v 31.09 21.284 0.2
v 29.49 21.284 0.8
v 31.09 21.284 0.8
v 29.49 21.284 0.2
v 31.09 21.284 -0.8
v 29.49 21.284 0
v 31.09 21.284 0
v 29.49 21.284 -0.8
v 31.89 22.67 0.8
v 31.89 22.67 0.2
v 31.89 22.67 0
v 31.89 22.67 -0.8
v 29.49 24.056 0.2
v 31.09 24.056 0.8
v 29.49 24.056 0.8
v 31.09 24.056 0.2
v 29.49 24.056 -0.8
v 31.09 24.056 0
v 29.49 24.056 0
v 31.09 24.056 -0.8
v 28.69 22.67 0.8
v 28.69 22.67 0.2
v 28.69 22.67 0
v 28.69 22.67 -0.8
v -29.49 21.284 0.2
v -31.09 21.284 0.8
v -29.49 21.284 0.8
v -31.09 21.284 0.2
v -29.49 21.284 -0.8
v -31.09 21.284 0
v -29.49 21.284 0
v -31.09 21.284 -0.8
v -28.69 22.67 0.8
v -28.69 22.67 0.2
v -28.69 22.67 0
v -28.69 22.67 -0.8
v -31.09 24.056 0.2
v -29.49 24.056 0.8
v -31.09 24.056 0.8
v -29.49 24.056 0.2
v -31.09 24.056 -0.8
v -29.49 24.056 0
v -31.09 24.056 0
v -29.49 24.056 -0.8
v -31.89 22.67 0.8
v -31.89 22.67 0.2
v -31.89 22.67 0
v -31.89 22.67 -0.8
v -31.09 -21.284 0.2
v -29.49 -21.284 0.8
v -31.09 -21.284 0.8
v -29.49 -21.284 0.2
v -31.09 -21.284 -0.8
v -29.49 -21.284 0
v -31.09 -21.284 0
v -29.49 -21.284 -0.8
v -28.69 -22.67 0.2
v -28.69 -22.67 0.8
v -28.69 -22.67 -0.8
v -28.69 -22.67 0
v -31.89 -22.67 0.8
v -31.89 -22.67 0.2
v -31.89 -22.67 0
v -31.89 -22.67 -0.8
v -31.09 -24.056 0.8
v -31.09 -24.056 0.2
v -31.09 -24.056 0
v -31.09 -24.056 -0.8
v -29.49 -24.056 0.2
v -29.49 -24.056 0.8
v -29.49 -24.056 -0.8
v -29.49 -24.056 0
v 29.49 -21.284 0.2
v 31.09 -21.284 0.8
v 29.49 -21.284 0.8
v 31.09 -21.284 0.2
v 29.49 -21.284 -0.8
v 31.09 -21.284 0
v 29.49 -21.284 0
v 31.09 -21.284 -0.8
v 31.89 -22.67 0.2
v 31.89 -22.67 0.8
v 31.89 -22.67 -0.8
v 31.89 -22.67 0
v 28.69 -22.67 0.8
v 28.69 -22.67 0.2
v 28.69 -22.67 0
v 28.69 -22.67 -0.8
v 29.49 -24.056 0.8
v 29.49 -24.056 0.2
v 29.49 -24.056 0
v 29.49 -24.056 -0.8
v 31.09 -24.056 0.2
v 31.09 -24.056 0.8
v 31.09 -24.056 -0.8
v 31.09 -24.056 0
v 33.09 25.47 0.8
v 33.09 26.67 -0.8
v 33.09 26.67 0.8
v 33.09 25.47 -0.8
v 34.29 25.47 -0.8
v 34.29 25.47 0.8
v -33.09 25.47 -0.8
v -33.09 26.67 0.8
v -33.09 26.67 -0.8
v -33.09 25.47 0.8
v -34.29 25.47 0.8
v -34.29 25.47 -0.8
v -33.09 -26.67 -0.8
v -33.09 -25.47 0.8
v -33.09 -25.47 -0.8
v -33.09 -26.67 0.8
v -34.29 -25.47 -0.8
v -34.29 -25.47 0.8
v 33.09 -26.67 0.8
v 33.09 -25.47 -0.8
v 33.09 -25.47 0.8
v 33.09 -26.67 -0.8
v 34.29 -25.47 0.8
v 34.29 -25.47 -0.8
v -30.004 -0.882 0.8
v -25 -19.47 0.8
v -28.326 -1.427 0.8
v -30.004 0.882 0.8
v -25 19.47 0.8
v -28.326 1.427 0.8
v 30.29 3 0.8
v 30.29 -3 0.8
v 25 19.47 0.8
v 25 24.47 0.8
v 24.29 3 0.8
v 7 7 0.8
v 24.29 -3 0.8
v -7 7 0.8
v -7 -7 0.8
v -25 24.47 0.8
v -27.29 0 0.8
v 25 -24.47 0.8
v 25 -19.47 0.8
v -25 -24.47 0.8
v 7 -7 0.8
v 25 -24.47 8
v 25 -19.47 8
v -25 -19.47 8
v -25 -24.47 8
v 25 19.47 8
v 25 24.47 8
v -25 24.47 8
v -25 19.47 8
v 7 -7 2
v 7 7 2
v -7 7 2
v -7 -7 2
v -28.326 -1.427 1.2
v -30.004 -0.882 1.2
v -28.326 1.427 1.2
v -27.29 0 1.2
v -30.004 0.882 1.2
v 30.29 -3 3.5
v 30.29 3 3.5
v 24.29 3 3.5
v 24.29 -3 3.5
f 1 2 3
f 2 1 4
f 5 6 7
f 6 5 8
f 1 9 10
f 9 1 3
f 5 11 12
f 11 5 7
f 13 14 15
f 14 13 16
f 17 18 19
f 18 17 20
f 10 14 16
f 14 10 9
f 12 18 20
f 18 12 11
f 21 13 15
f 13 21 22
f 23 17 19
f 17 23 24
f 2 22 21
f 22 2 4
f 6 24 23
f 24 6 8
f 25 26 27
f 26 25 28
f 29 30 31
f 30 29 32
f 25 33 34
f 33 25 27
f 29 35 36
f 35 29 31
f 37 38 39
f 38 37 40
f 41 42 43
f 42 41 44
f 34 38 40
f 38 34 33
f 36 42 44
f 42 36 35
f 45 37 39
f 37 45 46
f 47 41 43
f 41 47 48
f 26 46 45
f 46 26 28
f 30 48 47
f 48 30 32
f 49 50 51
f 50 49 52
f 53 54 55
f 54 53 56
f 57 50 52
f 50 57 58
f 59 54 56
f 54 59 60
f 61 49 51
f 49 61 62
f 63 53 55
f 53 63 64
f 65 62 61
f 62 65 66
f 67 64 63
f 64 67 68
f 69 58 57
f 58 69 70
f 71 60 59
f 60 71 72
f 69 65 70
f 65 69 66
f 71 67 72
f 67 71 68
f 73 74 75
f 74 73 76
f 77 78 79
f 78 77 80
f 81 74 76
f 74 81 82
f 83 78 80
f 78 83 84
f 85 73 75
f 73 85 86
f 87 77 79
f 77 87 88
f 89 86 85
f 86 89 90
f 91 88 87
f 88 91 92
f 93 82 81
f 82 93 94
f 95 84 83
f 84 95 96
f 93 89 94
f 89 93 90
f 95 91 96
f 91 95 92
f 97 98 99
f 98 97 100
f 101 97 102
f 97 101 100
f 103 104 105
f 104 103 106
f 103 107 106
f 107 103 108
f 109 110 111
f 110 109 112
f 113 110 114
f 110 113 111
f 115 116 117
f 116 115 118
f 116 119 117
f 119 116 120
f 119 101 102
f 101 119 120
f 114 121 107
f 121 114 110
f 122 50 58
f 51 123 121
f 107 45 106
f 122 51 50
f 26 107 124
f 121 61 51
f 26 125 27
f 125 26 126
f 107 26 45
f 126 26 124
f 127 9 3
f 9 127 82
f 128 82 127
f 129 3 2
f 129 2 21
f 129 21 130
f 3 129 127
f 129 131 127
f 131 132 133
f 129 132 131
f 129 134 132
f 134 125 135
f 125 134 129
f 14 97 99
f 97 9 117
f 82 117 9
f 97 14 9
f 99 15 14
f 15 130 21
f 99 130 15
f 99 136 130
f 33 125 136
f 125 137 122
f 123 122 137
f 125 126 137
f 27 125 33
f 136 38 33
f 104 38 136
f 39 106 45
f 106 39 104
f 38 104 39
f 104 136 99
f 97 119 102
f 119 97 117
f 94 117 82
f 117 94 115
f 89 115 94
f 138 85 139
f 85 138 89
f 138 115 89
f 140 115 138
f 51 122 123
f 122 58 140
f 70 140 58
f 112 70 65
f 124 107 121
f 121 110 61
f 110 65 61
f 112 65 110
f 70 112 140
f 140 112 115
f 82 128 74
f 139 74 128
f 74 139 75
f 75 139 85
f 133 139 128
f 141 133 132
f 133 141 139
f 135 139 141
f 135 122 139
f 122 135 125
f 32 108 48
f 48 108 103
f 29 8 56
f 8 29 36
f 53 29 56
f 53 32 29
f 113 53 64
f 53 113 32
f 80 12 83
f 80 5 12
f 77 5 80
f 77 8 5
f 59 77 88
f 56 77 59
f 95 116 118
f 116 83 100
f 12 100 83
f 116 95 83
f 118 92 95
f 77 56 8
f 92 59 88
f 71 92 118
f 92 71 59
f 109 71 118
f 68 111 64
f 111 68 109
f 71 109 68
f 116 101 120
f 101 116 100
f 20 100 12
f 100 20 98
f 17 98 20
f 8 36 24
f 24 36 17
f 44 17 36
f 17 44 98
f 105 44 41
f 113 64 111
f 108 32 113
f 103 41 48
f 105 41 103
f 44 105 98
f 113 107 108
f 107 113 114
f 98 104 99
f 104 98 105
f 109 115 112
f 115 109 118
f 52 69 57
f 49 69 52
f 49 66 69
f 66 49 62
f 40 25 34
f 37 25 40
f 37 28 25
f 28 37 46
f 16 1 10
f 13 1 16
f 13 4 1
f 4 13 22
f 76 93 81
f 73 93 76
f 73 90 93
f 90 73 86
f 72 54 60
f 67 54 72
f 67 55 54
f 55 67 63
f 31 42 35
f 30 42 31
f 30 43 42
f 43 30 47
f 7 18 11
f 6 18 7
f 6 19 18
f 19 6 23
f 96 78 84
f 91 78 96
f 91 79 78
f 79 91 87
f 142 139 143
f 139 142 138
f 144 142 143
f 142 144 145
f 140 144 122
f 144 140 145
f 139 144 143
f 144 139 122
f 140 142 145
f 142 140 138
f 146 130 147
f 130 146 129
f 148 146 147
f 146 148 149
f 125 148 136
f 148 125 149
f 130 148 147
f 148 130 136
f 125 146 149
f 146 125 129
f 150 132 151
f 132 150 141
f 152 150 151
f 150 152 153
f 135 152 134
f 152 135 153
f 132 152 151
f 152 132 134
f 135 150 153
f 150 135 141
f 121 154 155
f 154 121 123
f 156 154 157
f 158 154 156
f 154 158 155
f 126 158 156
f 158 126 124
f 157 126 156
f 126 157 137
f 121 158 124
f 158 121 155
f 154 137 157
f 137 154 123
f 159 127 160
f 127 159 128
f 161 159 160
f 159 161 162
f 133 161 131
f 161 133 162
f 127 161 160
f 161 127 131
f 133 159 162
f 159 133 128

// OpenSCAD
// Parameters
pcb_L = 68.58; //[34.29:137.16:0.01]
pcb_W = 53.34; //[26.67:106.68:0.01]
pcb_T = 1.6; //[0.8:3.2:0.1]
hole_d = 3.2; //[1.6:6.4:0.1]
hole_edge_margin = 4.0; //[2.0:8.0:0.1]
hole_cut_extra = 0.6; //[0.2:2.0:0.1]
chamfer_size = 2.0; //[0.5:6.0:0.1]
chamfer_overlap = 0.8; //[0.2:2.0:0.1]
silk_T = 0.2; //[0.1:0.6:0.05]
silk_inset = 2.0; //[0.5:6.0:0.1]
header_L = 50.0; //[25.0:100.0:0.1]
header_W = 5.0; //[2.5:10.0:0.1]
header_H = 8.0; //[4.0:16.0:0.1]
header_edge_gap = 3.0; //[1.0:8.0:0.1]
attach_overlap = 0.8; //[0.2:2.0:0.1]
ic_L = 14.0; //[7.0:28.0:0.1]
ic_W = 14.0; //[7.0:28.0:0.1]
ic_H = 2.0; //[1.0:6.0:0.1]
led_r = 1.5; //[0.8:3.5:0.1]
led_H = 1.2; //[0.6:3.0:0.1]
button_L = 6.0; //[3.0:12.0:0.1]
button_W = 6.0; //[3.0:12.0:0.1]
button_H = 3.5; //[1.5:8.0:0.1]

// Main PCB Body
module pcb_main_body() {
  color([0.0, 0.4, 0.2]) // Green for PCB
  cube([pcb_L, pcb_W, pcb_T], center=true);
}

// Mounting Holes
module mounting_hole_cyl(position) {
  translate(position)
    cylinder(r=hole_d/2, h=pcb_T + hole_cut_extra, center=true);
}

module mounting_holes() {
  union() {
    mounting_hole_cyl([pcb_L/2 - hole_edge_margin, pcb_W/2 - hole_edge_margin, 0]);
    mounting_hole_cyl([-pcb_L/2 + hole_edge_margin, pcb_W/2 - hole_edge_margin, 0]);
    mounting_hole_cyl([-pcb_L/2 + hole_edge_margin, -pcb_W/2 + hole_edge_margin, 0]);
    mounting_hole_cyl([pcb_L/2 - hole_edge_margin, -pcb_W/2 + hole_edge_margin, 0]);
  }
}

// Chamfer Cuts
module chamfer_cut(position) {
  translate(position)
    cube([chamfer_size, chamfer_size, pcb_T + hole_cut_extra], center=true);
}

module edge_chamfer() {
  union() {
    chamfer_cut([pcb_L/2 - chamfer_size/2 + chamfer_overlap, pcb_W/2 - chamfer_size/2 + chamfer_overlap, 0]);
    chamfer_cut([-pcb_L/2 + chamfer_size/2 - chamfer_overlap, pcb_W/2 - chamfer_size/2 + chamfer_overlap, 0]);
    chamfer_cut([-pcb_L/2 + chamfer_size/2 - chamfer_overlap, -pcb_W/2 + chamfer_size/2 - chamfer_overlap, 0]);
    chamfer_cut([pcb_L/2 - chamfer_size/2 + chamfer_overlap, -pcb_W/2 + chamfer_size/2 - chamfer_overlap, 0]);
  }
}

// Silkscreen Markings
module silkscreen_markings() {
  color("White")
  translate([0, 0, pcb_T/2 + silk_T/2 - attach_overlap])
    cube([pcb_L - 2*silk_inset, pcb_W - 2*silk_inset, silk_T], center=true);
}

// Connectors Headers
module connectors_headers_left() {
  color("Black")
  translate([0, -pcb_W/2 + header_edge_gap + header_W/2 - attach_overlap, pcb_T/2 + header_H/2 - attach_overlap])
    cube([header_L, header_W, header_H], center=true);
}

module connectors_headers_right() {
  color("Black")
  translate([0, pcb_W/2 - header_edge_gap - header_W/2 + attach_overlap, pcb_T/2 + header_H/2 - attach_overlap])
    cube([header_L, header_W, header_H], center=true);
}

// IC Packages
module ic_packages_main() {
  color("DimGray")
  translate([0, 0, pcb_T/2 + ic_H/2 - attach_overlap])
    cube([ic_L, ic_W, ic_H], center=true);
}

// LEDs and Buttons
module leds_buttons_led1() {
  color("Red")
  translate([-pcb_L/2 + hole_edge_margin + led_r, 0, pcb_T/2 + led_H/2 - attach_overlap])
    cylinder(r=led_r, h=led_H, center=true);
}

module leds_buttons_button1() {
  color("Blue")
  translate([pcb_L/2 - hole_edge_margin - button_L/2, 0, pcb_T/2 + button_H/2 - attach_overlap])
    cube([button_L, button_W, button_H], center=true);
}

// Complete Model
module complete_model() {
  union() {
    difference() {
      pcb_main_body();
      mounting_holes();
      edge_chamfer();
    }
    silkscreen_markings();
    connectors_headers_left();
    connectors_headers_right();
    ic_packages_main();
    leds_buttons_led1();
    leds_buttons_button1();
  }
}

// Render the complete model
complete_model();
